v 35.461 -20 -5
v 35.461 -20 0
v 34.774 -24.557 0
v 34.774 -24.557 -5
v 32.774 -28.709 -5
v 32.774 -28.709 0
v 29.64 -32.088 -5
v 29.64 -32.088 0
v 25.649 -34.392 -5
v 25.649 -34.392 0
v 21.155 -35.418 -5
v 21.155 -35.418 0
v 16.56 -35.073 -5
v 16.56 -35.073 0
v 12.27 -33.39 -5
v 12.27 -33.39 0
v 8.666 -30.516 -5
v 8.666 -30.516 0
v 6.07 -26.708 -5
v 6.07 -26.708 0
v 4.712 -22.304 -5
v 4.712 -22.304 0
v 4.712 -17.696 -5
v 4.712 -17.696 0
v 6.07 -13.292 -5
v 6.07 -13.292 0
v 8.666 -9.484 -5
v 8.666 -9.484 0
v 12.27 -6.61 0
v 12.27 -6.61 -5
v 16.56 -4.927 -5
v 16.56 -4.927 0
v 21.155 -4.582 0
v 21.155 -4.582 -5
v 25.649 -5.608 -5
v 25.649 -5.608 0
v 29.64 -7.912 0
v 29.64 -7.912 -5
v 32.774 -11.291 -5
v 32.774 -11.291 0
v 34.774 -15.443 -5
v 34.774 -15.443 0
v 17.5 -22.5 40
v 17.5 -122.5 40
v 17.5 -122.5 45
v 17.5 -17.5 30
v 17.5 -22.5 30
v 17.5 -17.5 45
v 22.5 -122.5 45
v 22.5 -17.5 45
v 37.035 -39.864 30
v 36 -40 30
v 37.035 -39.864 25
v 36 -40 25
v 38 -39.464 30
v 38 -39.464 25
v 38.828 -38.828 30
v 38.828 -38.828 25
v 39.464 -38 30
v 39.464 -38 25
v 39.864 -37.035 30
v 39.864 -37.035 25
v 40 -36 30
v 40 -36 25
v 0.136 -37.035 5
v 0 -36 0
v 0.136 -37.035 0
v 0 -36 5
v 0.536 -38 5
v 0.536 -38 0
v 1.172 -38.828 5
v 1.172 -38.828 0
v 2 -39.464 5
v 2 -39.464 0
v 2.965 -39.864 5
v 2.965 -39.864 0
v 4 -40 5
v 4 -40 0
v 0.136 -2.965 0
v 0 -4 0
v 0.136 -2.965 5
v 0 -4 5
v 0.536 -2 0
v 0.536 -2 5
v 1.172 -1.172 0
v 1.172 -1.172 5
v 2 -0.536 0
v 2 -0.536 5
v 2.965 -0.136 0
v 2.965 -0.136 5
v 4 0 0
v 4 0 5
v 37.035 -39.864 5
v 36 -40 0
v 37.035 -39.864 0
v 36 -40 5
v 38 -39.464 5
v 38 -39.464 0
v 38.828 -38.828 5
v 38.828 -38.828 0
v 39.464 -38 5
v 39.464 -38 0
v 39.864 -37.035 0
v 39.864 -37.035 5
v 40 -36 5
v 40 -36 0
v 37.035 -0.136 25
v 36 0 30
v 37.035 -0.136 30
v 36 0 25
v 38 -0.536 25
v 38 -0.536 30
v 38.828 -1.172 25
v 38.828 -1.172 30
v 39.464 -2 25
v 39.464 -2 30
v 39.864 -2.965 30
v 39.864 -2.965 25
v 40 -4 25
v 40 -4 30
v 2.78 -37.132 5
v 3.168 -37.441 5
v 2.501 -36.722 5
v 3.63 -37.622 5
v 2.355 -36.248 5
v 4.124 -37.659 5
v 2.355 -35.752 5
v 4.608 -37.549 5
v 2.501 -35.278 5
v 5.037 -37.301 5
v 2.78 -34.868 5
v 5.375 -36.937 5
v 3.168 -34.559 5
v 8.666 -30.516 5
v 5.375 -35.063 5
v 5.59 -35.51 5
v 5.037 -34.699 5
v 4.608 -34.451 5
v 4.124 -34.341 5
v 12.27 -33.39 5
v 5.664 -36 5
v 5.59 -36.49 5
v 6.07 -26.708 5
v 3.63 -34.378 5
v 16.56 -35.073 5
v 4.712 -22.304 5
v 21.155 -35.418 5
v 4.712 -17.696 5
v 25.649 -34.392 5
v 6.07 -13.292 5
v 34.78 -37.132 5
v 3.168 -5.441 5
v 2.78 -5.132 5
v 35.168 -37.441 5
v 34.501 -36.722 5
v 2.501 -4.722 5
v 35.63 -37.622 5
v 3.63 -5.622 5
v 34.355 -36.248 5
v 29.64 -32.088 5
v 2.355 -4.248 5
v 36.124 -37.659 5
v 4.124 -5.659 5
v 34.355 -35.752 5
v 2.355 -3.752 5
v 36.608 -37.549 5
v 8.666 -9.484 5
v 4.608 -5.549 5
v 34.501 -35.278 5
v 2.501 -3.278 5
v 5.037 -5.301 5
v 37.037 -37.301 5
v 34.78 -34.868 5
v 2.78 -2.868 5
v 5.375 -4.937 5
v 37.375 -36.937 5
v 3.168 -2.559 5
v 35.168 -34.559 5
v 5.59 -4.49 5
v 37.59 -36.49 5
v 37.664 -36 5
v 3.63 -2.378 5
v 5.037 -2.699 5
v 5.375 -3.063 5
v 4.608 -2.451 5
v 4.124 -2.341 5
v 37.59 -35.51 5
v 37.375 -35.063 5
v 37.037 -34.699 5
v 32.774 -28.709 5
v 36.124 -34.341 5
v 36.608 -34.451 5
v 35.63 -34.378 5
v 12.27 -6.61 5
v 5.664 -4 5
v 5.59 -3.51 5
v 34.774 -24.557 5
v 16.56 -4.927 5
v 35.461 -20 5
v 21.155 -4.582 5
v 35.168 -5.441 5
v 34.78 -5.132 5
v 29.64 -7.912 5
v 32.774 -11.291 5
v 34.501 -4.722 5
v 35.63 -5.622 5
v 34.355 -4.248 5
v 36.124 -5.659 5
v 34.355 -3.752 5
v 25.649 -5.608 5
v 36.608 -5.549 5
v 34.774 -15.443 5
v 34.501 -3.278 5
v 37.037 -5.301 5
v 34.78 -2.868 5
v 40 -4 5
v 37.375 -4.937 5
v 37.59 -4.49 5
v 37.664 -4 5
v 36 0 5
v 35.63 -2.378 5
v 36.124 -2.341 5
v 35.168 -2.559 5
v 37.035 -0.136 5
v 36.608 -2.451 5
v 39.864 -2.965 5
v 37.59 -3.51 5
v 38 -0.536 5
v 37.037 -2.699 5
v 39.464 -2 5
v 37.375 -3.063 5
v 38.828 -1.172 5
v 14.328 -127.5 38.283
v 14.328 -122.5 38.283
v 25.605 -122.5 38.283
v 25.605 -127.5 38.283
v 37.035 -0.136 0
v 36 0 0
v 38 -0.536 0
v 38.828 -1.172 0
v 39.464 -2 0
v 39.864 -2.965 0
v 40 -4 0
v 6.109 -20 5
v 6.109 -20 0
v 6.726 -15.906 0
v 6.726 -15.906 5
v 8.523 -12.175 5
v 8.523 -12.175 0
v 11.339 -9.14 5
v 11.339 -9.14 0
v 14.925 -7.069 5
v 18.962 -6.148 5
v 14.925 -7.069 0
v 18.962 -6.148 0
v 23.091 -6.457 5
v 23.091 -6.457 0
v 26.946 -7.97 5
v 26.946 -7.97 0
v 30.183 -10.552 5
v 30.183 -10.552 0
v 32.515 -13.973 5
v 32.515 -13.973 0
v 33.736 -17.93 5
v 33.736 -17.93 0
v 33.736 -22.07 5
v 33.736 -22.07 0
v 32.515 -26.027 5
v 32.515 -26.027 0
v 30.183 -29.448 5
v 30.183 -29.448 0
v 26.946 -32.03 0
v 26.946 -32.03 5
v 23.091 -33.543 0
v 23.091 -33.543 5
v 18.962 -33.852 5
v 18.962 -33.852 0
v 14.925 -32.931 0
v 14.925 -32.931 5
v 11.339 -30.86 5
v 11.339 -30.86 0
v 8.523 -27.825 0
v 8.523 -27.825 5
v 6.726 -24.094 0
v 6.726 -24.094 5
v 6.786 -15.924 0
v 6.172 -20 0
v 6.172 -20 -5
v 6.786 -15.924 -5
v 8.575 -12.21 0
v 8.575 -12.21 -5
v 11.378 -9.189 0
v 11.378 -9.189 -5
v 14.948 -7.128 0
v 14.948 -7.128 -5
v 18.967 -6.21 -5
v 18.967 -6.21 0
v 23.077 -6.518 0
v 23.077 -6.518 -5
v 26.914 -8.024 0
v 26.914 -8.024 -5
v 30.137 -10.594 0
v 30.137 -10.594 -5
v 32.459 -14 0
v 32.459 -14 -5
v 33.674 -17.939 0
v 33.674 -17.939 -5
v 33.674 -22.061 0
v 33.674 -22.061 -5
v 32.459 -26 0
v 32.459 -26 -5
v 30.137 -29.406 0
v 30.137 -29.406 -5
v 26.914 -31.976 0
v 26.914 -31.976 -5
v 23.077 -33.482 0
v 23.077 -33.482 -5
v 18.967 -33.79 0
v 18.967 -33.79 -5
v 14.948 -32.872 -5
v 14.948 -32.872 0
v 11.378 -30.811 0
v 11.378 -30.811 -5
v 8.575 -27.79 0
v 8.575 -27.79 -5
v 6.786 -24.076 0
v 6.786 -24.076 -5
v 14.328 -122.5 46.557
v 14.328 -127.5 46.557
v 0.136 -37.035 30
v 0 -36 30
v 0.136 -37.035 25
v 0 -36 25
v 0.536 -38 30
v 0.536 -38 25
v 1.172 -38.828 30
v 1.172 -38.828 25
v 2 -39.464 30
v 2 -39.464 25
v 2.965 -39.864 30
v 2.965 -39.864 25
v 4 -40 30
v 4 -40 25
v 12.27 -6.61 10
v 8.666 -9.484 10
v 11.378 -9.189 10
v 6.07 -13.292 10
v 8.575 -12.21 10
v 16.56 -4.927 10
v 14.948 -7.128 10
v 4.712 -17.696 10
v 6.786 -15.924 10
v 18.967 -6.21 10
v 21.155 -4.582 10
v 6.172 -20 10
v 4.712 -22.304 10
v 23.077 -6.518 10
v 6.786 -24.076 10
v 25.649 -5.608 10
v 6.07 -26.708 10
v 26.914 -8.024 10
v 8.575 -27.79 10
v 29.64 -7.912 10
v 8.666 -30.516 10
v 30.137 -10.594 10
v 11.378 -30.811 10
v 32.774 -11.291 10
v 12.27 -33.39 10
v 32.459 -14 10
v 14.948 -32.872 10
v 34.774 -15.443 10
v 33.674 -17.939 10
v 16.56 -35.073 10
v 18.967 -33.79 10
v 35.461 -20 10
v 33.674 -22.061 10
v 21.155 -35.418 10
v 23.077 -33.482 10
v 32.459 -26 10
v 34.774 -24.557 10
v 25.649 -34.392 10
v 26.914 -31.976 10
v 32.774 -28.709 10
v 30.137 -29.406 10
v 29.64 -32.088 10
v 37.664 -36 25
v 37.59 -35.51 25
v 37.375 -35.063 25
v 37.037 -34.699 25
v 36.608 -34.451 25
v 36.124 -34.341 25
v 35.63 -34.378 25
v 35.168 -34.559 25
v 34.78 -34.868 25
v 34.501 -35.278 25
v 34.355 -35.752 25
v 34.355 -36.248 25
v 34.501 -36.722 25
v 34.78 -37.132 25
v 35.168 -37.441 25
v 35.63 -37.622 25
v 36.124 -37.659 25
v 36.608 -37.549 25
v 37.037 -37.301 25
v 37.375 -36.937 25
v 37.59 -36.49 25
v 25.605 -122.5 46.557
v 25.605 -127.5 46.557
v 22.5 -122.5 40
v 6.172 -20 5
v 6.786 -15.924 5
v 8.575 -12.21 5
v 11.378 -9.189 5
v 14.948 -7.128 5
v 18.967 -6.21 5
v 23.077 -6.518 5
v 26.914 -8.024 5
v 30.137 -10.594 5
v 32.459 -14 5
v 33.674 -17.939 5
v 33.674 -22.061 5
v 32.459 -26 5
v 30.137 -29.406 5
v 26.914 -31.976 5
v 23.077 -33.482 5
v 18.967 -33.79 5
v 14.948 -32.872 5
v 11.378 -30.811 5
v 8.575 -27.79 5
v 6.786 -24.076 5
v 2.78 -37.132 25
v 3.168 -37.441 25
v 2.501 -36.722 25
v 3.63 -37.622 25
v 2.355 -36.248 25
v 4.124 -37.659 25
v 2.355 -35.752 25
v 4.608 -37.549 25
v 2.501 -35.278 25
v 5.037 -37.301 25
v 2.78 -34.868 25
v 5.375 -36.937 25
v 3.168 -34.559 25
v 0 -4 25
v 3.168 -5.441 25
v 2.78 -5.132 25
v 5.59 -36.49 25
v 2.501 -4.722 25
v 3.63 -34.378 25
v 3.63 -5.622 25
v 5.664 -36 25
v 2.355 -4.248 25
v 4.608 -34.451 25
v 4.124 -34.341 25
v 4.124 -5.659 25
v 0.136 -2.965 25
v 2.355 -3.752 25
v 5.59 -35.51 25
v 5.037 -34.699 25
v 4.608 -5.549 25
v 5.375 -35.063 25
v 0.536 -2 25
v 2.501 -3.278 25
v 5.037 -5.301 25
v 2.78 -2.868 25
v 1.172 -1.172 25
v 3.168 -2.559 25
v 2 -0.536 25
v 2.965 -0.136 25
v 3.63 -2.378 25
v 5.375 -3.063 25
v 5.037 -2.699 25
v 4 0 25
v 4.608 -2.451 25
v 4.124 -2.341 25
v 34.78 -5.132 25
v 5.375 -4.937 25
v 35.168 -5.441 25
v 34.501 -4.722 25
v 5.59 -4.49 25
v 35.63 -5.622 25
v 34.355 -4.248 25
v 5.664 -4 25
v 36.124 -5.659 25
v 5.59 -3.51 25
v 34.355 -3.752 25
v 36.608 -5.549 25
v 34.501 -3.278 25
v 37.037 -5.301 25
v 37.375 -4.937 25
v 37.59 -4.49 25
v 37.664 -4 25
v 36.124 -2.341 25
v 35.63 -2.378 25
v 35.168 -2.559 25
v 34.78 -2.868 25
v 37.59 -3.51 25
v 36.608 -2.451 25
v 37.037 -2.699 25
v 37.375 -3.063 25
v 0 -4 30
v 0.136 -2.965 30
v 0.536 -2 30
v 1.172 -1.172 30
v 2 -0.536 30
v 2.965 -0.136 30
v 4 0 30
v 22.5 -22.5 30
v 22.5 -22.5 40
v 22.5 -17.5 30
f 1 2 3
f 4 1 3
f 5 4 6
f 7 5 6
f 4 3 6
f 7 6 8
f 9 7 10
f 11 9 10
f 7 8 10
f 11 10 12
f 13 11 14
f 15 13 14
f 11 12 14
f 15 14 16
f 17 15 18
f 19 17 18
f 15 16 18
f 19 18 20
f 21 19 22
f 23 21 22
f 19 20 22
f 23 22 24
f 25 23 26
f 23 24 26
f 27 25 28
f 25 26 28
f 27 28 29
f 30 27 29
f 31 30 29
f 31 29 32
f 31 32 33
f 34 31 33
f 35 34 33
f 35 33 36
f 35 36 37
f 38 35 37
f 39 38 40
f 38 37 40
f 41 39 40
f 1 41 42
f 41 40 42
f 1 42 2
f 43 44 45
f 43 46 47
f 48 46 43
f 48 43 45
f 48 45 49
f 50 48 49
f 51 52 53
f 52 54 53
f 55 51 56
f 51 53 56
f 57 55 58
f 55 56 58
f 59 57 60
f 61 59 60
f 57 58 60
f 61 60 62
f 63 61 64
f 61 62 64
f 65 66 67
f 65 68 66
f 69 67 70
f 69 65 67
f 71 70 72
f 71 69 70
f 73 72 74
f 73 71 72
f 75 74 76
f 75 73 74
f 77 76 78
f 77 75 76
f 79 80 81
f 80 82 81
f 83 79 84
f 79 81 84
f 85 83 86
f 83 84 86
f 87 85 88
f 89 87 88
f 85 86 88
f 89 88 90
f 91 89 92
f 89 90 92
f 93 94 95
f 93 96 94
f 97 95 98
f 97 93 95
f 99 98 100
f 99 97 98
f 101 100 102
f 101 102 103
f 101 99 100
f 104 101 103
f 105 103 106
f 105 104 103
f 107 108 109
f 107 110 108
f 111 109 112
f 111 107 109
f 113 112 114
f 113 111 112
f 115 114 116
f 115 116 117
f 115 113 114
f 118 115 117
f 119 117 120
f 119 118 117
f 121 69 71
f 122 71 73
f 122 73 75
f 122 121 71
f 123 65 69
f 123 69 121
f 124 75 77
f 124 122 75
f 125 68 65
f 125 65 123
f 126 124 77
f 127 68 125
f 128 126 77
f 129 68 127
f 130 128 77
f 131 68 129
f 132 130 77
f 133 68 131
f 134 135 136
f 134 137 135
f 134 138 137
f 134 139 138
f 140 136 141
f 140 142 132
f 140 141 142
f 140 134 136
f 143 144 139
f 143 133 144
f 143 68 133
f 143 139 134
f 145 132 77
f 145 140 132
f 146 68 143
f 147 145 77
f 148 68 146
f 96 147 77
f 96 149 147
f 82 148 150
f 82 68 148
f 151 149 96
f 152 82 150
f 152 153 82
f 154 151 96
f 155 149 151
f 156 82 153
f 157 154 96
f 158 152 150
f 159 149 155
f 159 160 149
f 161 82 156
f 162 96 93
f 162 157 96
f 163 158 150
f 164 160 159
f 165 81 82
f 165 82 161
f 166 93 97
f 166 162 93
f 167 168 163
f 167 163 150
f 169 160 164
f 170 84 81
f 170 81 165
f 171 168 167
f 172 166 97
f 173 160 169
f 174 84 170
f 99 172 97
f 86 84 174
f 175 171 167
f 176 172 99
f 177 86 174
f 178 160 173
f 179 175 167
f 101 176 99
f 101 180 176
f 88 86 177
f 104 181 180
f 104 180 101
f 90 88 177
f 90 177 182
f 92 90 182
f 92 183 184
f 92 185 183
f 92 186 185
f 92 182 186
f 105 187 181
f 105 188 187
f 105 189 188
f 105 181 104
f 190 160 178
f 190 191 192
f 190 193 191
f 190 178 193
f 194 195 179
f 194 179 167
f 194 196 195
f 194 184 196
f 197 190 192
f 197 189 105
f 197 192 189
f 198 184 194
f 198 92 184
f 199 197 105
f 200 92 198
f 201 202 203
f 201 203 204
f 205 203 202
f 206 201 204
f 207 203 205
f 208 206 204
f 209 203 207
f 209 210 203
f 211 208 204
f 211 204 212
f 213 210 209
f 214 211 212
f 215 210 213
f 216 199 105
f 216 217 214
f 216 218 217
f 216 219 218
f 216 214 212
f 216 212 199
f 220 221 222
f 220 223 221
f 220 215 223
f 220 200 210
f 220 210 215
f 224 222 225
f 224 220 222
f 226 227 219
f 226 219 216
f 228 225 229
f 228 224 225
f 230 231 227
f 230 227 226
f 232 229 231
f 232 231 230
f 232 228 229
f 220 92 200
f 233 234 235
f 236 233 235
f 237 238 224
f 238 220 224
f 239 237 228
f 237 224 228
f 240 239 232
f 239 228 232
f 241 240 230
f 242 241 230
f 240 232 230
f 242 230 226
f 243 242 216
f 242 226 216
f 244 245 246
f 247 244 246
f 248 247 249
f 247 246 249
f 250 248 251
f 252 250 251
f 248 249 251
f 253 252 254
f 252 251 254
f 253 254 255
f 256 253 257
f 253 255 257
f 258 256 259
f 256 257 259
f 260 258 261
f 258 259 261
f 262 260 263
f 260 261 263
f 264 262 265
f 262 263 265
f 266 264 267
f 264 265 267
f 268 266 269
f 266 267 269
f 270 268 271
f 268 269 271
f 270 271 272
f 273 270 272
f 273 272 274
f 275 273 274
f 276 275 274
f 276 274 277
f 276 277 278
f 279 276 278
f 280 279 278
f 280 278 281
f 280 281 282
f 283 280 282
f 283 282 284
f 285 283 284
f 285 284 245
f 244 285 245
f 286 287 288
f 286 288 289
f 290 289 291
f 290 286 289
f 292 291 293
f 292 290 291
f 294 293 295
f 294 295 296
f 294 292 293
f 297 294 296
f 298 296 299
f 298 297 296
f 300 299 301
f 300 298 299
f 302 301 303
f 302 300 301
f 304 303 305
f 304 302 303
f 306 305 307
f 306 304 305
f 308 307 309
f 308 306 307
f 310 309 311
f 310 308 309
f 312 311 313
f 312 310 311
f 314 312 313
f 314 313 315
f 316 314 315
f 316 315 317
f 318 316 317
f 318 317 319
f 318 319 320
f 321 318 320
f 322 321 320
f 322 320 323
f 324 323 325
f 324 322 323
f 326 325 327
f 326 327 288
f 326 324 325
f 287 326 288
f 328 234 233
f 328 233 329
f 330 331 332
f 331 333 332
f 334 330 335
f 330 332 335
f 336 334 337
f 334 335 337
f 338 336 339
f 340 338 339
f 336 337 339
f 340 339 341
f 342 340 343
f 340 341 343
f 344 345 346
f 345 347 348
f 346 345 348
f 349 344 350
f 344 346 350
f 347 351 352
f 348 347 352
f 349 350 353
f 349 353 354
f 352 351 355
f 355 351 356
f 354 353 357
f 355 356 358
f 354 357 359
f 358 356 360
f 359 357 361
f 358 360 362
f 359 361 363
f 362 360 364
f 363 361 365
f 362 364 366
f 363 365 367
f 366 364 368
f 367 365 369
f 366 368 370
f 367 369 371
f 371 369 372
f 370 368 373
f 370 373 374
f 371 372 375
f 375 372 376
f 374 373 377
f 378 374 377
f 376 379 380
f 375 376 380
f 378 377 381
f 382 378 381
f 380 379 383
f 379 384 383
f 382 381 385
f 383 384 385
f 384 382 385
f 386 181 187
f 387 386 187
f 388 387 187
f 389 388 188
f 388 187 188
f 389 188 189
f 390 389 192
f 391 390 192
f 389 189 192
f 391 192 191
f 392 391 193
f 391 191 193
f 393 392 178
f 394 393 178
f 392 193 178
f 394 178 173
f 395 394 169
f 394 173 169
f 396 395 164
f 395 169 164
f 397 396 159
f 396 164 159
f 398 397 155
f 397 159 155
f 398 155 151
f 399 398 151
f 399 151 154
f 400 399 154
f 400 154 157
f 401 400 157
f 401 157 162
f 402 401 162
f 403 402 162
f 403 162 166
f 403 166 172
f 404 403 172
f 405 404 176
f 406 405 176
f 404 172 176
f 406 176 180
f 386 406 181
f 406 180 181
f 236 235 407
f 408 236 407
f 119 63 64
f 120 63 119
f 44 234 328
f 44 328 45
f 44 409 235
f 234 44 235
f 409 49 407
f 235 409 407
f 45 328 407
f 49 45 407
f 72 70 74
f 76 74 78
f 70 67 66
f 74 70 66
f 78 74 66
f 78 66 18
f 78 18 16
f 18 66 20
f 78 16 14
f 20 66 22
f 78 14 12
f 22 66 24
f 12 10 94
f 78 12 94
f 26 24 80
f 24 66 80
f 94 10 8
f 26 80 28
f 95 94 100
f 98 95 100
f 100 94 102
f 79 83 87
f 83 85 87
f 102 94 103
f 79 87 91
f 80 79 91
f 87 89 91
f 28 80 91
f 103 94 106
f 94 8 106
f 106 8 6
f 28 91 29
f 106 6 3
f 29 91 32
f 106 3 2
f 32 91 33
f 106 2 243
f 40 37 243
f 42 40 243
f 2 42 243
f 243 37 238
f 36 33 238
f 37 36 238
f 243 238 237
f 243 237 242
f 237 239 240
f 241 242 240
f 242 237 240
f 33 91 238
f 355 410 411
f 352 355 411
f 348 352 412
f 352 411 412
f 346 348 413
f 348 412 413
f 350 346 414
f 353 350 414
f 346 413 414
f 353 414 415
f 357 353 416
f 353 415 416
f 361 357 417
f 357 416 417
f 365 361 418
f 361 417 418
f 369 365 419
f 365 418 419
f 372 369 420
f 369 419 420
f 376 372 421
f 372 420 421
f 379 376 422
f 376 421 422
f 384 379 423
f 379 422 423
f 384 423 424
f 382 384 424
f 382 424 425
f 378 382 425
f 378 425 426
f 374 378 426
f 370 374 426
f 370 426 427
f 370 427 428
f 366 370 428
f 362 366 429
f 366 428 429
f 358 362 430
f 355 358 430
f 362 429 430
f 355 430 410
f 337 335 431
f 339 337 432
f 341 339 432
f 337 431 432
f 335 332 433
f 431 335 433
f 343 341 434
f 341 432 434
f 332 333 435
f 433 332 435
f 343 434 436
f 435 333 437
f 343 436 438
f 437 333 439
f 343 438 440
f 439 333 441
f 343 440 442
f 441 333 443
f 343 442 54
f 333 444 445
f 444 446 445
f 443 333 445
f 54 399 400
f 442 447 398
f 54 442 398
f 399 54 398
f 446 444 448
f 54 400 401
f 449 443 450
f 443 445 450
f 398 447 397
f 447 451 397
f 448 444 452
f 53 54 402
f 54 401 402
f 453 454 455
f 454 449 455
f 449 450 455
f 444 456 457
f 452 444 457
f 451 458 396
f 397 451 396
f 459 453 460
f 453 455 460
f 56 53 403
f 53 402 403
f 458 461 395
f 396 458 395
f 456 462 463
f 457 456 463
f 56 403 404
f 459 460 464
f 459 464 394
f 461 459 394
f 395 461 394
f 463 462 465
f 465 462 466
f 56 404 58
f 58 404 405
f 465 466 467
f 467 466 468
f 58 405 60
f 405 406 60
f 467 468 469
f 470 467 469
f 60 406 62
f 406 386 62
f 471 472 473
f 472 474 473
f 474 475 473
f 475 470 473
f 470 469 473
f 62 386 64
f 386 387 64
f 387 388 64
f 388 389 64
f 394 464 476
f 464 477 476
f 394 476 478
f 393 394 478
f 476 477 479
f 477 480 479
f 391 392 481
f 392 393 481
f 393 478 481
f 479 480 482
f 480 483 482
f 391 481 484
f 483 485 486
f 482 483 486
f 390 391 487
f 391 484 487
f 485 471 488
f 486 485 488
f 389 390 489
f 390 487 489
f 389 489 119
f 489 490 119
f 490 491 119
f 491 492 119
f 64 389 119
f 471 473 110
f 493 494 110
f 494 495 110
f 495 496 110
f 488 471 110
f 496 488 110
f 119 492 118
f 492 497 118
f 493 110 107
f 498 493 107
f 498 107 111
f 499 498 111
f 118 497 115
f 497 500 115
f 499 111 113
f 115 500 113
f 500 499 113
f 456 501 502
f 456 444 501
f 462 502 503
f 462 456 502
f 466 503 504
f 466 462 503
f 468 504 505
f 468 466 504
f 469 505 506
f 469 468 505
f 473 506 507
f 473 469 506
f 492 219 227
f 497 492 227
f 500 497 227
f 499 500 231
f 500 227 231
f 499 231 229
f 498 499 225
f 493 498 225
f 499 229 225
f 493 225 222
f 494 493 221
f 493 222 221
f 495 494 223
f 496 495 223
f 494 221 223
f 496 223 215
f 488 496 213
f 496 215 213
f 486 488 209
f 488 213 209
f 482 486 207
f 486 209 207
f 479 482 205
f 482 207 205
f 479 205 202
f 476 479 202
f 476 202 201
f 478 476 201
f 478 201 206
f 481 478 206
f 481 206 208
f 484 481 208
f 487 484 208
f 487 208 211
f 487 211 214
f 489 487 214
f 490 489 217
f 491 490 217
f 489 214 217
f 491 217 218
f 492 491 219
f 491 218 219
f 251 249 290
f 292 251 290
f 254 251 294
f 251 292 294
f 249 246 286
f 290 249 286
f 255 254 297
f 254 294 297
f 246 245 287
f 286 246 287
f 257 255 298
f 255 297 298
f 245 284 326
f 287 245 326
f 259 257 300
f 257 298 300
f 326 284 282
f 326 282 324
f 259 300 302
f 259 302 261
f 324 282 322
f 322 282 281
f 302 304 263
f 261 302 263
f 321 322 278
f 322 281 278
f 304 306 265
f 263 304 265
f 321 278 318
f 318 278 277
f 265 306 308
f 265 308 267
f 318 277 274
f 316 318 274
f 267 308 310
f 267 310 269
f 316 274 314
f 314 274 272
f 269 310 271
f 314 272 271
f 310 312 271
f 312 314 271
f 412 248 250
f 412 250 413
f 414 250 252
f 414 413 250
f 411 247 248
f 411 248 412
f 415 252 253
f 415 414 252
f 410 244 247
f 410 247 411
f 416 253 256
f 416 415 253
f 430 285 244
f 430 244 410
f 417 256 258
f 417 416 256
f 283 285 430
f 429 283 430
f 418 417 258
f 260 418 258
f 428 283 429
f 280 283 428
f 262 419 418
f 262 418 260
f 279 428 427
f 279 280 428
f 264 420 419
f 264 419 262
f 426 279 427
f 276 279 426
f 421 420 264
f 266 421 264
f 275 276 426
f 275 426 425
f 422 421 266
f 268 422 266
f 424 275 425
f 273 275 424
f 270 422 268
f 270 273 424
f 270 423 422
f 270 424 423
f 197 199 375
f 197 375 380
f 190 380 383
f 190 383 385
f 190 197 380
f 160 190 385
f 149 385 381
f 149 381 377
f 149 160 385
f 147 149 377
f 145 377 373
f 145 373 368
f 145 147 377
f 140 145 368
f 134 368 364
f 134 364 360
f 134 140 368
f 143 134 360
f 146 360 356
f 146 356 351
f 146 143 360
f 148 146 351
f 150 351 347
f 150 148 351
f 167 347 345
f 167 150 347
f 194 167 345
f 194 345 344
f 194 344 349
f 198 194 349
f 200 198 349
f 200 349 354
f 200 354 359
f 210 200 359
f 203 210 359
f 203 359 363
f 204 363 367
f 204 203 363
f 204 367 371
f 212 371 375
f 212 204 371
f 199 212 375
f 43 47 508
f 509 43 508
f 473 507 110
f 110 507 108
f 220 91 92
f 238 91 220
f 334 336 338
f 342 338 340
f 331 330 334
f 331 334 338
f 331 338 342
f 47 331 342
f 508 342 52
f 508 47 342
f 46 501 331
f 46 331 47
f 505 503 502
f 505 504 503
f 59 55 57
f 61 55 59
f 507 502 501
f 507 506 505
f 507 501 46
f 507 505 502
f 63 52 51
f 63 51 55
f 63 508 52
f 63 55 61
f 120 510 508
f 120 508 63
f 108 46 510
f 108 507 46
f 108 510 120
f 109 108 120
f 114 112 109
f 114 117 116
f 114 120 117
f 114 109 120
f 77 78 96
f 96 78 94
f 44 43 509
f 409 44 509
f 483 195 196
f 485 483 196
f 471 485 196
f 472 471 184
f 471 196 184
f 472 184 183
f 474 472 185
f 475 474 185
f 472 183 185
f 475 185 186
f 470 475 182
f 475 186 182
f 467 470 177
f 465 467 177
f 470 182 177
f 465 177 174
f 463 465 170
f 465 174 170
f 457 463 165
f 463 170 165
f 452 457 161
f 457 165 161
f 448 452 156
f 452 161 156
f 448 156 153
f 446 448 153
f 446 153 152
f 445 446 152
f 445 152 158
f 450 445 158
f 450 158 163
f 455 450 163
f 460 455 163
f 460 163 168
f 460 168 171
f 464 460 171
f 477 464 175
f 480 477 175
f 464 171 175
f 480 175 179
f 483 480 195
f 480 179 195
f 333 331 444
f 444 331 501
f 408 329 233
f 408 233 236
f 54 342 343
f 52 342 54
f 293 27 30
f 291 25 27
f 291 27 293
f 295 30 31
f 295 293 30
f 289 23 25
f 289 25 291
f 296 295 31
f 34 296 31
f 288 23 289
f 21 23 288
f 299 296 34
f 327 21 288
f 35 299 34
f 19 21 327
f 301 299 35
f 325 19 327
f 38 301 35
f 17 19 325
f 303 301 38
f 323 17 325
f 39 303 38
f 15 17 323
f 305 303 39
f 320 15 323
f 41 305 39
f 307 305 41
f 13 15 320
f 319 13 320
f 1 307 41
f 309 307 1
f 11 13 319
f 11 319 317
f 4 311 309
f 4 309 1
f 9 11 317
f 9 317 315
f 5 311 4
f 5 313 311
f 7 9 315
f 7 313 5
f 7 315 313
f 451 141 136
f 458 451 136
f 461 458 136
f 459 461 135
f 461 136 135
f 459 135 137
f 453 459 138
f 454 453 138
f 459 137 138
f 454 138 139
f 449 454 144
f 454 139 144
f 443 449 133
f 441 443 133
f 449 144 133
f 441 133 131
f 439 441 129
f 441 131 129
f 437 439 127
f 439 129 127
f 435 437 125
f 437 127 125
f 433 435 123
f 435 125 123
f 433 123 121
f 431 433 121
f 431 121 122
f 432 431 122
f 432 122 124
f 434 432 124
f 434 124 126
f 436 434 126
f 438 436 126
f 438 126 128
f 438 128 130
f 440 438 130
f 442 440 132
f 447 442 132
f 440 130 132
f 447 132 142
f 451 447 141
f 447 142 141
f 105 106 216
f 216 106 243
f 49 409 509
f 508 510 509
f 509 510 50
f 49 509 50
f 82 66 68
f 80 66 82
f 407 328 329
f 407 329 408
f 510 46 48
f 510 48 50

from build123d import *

# Parameters (mm, degrees)
SKETCH1_W           = 40
SKETCH1_H           = 40
BOSS_EXTRUDE1_DEPTH = 5
SKETCH3_R           = 13.891
CUT_EXTRUDE1_DEPTH  = 57.789083458
SKETCH4_R           = 1.664017503
BOSS_EXTRUDE3_DEPTH = 20
SKETCH5_W           = 5
SKETCH5_H           = 5
BOSS_EXTRUDE4_DEPTH = 15
SKETCH6_W           = 5
SKETCH6_H           = 5
BOSS_EXTRUDE5_DEPTH = 100
SKETCH7_R           = 15.460977434
SKETCH7_R_2         = 13.828216596
BOSS_EXTRUDE6_DEPTH = 5
SKETCH8_W           = 11.277313534
SKETCH8_H           = 8.274115908
BOSS_EXTRUDE7_DEPTH = 5
FILLET1_R           = 4
FILLET2_R           = 4


with BuildPart() as part:
    # Sketch1 → Boss-Extrude1 (new body)
    with BuildSketch(Plane.XY):
        with Locations((20, -20)):
            Rectangle(SKETCH1_W, SKETCH1_H)
    boss_extrude1 = extrude(amount=BOSS_EXTRUDE1_DEPTH)

    # Sketch3 → Cut-Extrude1 (cut, through all)
    with BuildSketch(Plane(origin=(0, 0, 0), x_dir=(-1, 0, 0), z_dir=(0, 0, -1))):
        with Locations((-20, -20)):
            Circle(SKETCH3_R)
    extrude(amount=-CUT_EXTRUDE1_DEPTH, mode=Mode.SUBTRACT)

    # Sketch4 → Boss-Extrude3 (add)
    with BuildSketch(Plane.XY.offset(5)):
        with Locations((4, -4)):
            Circle(SKETCH4_R)
        with Locations((36, -4)):
            Circle(SKETCH4_R)
        with Locations((36, -36)):
            Circle(SKETCH4_R)
        with Locations((4, -36)):
            Circle(SKETCH4_R)
    extrude(amount=BOSS_EXTRUDE3_DEPTH)

    # Mirror1: Boss-Extrude1 across plane
    add(boss_extrude1.mirror(Plane.XY.offset(15)))

    # Sketch5 → Boss-Extrude4 (add)
    with BuildSketch(Plane.XY.offset(30)):
        with Locations((20, -20)):
            Rectangle(SKETCH5_W, SKETCH5_H)
    extrude(amount=BOSS_EXTRUDE4_DEPTH)

    # Sketch6 → Boss-Extrude5 (add)
    with BuildSketch(Plane.XZ.offset(22.5)):
        with Locations((20, 42.5)):
            Rectangle(SKETCH6_W, SKETCH6_H)
    extrude(amount=BOSS_EXTRUDE5_DEPTH)

    # Sketch7 → Boss-Extrude6 (add)
    with BuildSketch(Plane(origin=(0, 0, 0), x_dir=(-1, 0, 0), z_dir=(0, 0, -1))):
        with Locations(Location((-20, -20, 0), (0, 0, 180))):
            Circle(SKETCH7_R)
        with Locations((-20, -20)):
            Circle(SKETCH7_R_2, mode=Mode.SUBTRACT)
    boss_extrude6 = extrude(amount=BOSS_EXTRUDE6_DEPTH)

    # Mirror3: Boss-Extrude6 across plane
    add(boss_extrude6.mirror(Plane.XY.offset(2.5)))

    # Sketch8 → Boss-Extrude7 (add)
    with BuildSketch(Plane.XZ.offset(122.5)):
        with Locations((19.966542914, 42.419592184)):
            Rectangle(SKETCH8_W, SKETCH8_H)
    extrude(amount=BOSS_EXTRUDE7_DEPTH)

    # Fillet1
    fillet1_edges = [part.edges().sort_by_distance(p)[0] for p in [
        (0, 0, 2.5),
    ]]
    fillet(fillet1_edges, radius=FILLET1_R)

    # Fillet2
    fillet2_edges = [part.edges().sort_by_distance(p)[0] for p in [
        (0, -40, 27.5),
        (0, 0, 27.5),
        (40, 0, 27.5),
        (40, -40, 27.5),
        (40, 0, 2.5),
        (40, -40, 2.5),
        (0, -40, 2.5),
    ]]
    fillet(fillet2_edges, radius=FILLET2_R)


solid = part.part
